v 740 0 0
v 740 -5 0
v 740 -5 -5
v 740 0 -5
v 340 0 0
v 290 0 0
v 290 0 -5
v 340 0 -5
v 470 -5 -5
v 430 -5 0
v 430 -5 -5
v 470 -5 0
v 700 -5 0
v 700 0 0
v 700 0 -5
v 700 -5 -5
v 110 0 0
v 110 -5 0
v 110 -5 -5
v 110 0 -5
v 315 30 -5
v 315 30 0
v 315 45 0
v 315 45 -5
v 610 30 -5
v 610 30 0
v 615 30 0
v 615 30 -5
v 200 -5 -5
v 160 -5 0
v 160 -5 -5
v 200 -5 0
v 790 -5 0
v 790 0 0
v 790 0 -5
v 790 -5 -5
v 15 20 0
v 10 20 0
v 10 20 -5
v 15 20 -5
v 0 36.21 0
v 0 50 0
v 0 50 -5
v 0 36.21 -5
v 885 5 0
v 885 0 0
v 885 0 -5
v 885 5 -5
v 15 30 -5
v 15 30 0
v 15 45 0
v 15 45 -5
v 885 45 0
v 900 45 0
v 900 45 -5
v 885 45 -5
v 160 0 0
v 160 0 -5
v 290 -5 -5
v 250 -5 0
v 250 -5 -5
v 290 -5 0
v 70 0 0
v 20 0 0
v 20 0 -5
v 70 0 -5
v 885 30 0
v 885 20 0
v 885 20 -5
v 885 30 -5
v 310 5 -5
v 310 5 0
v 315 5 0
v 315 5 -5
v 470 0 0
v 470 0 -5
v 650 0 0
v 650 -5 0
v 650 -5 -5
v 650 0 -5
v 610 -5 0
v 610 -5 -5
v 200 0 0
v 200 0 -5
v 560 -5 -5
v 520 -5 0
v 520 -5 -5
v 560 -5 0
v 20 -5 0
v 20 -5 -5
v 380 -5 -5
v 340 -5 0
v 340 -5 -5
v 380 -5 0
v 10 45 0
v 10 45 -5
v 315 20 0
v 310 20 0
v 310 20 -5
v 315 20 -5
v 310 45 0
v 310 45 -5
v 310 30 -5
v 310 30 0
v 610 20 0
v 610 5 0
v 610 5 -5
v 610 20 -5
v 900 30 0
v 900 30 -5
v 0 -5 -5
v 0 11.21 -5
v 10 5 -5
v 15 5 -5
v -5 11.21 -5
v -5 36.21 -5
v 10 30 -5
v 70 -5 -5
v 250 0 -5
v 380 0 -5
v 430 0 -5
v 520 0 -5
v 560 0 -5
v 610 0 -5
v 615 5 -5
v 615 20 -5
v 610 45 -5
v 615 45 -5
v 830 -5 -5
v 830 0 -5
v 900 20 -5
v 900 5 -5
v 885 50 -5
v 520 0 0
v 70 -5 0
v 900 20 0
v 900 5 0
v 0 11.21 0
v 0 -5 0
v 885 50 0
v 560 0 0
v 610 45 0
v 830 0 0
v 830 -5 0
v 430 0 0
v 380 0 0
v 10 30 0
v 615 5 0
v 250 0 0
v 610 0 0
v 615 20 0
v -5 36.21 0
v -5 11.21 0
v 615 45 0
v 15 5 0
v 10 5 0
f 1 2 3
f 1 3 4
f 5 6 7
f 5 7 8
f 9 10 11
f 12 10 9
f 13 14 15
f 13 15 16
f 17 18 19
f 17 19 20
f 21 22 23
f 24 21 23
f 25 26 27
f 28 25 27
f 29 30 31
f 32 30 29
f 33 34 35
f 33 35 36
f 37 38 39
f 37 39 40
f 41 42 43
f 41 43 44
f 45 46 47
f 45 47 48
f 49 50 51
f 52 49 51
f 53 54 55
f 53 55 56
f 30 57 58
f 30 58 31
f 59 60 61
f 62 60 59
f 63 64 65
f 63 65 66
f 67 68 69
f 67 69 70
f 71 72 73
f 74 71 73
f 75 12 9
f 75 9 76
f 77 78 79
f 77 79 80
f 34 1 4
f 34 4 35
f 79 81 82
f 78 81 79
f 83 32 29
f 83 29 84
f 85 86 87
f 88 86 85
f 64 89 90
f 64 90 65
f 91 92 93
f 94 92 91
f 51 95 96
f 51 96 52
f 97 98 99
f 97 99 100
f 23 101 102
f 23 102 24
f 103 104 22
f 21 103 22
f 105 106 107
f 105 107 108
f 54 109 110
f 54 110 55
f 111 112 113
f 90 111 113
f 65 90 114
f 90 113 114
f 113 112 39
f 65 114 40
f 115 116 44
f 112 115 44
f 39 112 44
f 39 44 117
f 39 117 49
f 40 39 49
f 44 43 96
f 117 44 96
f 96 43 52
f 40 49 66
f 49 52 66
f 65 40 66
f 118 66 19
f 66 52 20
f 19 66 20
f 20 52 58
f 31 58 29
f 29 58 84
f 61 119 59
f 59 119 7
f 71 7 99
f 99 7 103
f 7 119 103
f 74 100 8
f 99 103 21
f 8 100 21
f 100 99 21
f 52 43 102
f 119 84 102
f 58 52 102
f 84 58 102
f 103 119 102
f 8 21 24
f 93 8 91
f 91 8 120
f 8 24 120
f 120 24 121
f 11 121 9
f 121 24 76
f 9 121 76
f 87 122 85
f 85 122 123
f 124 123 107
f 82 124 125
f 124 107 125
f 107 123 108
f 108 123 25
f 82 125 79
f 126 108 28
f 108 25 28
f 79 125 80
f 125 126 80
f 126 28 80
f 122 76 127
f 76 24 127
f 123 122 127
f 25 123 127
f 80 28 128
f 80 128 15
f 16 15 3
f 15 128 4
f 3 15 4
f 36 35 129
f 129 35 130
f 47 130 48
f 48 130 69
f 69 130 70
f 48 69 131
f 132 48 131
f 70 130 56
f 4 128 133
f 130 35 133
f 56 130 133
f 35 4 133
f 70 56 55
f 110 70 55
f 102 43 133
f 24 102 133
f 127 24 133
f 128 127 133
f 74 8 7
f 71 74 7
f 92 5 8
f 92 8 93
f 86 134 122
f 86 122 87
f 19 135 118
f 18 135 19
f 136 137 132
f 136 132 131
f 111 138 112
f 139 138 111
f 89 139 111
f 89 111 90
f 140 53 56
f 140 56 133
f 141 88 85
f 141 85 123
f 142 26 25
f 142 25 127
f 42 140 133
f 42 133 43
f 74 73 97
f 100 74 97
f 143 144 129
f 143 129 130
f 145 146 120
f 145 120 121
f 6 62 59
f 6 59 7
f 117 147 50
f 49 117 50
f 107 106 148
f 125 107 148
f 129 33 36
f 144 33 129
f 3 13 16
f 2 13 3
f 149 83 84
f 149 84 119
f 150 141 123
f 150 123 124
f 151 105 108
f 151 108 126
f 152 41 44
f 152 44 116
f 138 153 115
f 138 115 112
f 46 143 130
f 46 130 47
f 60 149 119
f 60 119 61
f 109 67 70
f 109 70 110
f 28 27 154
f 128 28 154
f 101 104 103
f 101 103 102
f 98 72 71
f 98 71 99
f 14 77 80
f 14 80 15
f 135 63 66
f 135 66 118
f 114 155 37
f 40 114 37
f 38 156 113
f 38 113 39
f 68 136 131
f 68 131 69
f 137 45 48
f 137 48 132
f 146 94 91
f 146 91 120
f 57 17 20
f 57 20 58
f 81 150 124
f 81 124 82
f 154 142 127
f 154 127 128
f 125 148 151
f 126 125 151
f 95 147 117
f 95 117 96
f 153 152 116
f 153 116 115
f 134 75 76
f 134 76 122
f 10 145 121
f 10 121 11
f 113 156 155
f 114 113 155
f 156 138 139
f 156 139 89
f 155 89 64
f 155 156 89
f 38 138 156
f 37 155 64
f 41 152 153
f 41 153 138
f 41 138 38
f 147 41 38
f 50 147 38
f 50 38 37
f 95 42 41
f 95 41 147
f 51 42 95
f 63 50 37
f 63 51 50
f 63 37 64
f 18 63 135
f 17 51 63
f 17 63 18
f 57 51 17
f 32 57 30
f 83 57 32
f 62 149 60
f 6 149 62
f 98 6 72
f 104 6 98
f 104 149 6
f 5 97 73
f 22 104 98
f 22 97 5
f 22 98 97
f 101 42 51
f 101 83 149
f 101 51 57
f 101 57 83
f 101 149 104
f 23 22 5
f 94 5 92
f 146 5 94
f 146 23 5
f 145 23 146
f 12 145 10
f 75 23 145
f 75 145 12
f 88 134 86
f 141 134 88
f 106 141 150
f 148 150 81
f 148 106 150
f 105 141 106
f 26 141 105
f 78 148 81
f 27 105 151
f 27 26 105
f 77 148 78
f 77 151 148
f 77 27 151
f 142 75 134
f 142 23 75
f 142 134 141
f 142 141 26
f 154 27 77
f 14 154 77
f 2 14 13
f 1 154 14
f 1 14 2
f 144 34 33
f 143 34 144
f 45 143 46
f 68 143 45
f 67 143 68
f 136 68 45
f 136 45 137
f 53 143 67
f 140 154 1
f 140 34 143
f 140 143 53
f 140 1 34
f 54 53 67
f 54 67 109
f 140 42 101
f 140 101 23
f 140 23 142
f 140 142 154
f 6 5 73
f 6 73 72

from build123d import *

# Parameters (mm, degrees)
SKETCH1_W           = 5
SKETCH1_H           = 15
BOSS_EXTRUDE1_DEPTH = 5


with BuildPart() as part:
    # Sketch1 → Boss-Extrude1 (new body)
    with BuildSketch(Plane.XY):
        Polygon((885, 50), (0, 50), (0, 36.209811371), (-5, 36.209811371), (-5, 11.209811371), (0, 11.209811371), (0, -5), (20, -5), (20, 0), (70, 0), (70, -5), (110, -5), (110, 0), (160, 0), (160, -5), (200, -5), (200, 0), (250, 0), (250, -5), (290, -5), (290, 0), (340, 0), (340, -5), (380, -5), (380, 0), (430, 0), (430, -5), (470, -5), (470, 0), (520, 0), (520, -5), (560, -5), (560, 0), (610, 0), (610, -5), (650, -5), (650, 0), (700, 0), (700, -5), (740, -5), (740, 0), (790, 0), (790, -5), (830, -5), (830, 0), (885, 0), (885, 5), (900, 5), (900, 20), (885, 20), (885, 30), (900, 30), (900, 45), (885, 45), align=None)
        with Locations((12.5, 12.5)):
            Rectangle(SKETCH1_W, SKETCH1_H, mode=Mode.SUBTRACT)
        with Locations((312.5, 12.5)):
            Rectangle(SKETCH1_W, SKETCH1_H, mode=Mode.SUBTRACT)
        with Locations((612.5, 12.5)):
            Rectangle(SKETCH1_W, SKETCH1_H, mode=Mode.SUBTRACT)
        with Locations((12.5, 37.5)):
            Rectangle(SKETCH1_W, SKETCH1_H, mode=Mode.SUBTRACT)
        with Locations((312.5, 37.5)):
            Rectangle(SKETCH1_W, SKETCH1_H, mode=Mode.SUBTRACT)
        with Locations((612.5, 37.5)):
            Rectangle(SKETCH1_W, SKETCH1_H, mode=Mode.SUBTRACT)
    extrude(amount=-BOSS_EXTRUDE1_DEPTH)


solid = part.part
